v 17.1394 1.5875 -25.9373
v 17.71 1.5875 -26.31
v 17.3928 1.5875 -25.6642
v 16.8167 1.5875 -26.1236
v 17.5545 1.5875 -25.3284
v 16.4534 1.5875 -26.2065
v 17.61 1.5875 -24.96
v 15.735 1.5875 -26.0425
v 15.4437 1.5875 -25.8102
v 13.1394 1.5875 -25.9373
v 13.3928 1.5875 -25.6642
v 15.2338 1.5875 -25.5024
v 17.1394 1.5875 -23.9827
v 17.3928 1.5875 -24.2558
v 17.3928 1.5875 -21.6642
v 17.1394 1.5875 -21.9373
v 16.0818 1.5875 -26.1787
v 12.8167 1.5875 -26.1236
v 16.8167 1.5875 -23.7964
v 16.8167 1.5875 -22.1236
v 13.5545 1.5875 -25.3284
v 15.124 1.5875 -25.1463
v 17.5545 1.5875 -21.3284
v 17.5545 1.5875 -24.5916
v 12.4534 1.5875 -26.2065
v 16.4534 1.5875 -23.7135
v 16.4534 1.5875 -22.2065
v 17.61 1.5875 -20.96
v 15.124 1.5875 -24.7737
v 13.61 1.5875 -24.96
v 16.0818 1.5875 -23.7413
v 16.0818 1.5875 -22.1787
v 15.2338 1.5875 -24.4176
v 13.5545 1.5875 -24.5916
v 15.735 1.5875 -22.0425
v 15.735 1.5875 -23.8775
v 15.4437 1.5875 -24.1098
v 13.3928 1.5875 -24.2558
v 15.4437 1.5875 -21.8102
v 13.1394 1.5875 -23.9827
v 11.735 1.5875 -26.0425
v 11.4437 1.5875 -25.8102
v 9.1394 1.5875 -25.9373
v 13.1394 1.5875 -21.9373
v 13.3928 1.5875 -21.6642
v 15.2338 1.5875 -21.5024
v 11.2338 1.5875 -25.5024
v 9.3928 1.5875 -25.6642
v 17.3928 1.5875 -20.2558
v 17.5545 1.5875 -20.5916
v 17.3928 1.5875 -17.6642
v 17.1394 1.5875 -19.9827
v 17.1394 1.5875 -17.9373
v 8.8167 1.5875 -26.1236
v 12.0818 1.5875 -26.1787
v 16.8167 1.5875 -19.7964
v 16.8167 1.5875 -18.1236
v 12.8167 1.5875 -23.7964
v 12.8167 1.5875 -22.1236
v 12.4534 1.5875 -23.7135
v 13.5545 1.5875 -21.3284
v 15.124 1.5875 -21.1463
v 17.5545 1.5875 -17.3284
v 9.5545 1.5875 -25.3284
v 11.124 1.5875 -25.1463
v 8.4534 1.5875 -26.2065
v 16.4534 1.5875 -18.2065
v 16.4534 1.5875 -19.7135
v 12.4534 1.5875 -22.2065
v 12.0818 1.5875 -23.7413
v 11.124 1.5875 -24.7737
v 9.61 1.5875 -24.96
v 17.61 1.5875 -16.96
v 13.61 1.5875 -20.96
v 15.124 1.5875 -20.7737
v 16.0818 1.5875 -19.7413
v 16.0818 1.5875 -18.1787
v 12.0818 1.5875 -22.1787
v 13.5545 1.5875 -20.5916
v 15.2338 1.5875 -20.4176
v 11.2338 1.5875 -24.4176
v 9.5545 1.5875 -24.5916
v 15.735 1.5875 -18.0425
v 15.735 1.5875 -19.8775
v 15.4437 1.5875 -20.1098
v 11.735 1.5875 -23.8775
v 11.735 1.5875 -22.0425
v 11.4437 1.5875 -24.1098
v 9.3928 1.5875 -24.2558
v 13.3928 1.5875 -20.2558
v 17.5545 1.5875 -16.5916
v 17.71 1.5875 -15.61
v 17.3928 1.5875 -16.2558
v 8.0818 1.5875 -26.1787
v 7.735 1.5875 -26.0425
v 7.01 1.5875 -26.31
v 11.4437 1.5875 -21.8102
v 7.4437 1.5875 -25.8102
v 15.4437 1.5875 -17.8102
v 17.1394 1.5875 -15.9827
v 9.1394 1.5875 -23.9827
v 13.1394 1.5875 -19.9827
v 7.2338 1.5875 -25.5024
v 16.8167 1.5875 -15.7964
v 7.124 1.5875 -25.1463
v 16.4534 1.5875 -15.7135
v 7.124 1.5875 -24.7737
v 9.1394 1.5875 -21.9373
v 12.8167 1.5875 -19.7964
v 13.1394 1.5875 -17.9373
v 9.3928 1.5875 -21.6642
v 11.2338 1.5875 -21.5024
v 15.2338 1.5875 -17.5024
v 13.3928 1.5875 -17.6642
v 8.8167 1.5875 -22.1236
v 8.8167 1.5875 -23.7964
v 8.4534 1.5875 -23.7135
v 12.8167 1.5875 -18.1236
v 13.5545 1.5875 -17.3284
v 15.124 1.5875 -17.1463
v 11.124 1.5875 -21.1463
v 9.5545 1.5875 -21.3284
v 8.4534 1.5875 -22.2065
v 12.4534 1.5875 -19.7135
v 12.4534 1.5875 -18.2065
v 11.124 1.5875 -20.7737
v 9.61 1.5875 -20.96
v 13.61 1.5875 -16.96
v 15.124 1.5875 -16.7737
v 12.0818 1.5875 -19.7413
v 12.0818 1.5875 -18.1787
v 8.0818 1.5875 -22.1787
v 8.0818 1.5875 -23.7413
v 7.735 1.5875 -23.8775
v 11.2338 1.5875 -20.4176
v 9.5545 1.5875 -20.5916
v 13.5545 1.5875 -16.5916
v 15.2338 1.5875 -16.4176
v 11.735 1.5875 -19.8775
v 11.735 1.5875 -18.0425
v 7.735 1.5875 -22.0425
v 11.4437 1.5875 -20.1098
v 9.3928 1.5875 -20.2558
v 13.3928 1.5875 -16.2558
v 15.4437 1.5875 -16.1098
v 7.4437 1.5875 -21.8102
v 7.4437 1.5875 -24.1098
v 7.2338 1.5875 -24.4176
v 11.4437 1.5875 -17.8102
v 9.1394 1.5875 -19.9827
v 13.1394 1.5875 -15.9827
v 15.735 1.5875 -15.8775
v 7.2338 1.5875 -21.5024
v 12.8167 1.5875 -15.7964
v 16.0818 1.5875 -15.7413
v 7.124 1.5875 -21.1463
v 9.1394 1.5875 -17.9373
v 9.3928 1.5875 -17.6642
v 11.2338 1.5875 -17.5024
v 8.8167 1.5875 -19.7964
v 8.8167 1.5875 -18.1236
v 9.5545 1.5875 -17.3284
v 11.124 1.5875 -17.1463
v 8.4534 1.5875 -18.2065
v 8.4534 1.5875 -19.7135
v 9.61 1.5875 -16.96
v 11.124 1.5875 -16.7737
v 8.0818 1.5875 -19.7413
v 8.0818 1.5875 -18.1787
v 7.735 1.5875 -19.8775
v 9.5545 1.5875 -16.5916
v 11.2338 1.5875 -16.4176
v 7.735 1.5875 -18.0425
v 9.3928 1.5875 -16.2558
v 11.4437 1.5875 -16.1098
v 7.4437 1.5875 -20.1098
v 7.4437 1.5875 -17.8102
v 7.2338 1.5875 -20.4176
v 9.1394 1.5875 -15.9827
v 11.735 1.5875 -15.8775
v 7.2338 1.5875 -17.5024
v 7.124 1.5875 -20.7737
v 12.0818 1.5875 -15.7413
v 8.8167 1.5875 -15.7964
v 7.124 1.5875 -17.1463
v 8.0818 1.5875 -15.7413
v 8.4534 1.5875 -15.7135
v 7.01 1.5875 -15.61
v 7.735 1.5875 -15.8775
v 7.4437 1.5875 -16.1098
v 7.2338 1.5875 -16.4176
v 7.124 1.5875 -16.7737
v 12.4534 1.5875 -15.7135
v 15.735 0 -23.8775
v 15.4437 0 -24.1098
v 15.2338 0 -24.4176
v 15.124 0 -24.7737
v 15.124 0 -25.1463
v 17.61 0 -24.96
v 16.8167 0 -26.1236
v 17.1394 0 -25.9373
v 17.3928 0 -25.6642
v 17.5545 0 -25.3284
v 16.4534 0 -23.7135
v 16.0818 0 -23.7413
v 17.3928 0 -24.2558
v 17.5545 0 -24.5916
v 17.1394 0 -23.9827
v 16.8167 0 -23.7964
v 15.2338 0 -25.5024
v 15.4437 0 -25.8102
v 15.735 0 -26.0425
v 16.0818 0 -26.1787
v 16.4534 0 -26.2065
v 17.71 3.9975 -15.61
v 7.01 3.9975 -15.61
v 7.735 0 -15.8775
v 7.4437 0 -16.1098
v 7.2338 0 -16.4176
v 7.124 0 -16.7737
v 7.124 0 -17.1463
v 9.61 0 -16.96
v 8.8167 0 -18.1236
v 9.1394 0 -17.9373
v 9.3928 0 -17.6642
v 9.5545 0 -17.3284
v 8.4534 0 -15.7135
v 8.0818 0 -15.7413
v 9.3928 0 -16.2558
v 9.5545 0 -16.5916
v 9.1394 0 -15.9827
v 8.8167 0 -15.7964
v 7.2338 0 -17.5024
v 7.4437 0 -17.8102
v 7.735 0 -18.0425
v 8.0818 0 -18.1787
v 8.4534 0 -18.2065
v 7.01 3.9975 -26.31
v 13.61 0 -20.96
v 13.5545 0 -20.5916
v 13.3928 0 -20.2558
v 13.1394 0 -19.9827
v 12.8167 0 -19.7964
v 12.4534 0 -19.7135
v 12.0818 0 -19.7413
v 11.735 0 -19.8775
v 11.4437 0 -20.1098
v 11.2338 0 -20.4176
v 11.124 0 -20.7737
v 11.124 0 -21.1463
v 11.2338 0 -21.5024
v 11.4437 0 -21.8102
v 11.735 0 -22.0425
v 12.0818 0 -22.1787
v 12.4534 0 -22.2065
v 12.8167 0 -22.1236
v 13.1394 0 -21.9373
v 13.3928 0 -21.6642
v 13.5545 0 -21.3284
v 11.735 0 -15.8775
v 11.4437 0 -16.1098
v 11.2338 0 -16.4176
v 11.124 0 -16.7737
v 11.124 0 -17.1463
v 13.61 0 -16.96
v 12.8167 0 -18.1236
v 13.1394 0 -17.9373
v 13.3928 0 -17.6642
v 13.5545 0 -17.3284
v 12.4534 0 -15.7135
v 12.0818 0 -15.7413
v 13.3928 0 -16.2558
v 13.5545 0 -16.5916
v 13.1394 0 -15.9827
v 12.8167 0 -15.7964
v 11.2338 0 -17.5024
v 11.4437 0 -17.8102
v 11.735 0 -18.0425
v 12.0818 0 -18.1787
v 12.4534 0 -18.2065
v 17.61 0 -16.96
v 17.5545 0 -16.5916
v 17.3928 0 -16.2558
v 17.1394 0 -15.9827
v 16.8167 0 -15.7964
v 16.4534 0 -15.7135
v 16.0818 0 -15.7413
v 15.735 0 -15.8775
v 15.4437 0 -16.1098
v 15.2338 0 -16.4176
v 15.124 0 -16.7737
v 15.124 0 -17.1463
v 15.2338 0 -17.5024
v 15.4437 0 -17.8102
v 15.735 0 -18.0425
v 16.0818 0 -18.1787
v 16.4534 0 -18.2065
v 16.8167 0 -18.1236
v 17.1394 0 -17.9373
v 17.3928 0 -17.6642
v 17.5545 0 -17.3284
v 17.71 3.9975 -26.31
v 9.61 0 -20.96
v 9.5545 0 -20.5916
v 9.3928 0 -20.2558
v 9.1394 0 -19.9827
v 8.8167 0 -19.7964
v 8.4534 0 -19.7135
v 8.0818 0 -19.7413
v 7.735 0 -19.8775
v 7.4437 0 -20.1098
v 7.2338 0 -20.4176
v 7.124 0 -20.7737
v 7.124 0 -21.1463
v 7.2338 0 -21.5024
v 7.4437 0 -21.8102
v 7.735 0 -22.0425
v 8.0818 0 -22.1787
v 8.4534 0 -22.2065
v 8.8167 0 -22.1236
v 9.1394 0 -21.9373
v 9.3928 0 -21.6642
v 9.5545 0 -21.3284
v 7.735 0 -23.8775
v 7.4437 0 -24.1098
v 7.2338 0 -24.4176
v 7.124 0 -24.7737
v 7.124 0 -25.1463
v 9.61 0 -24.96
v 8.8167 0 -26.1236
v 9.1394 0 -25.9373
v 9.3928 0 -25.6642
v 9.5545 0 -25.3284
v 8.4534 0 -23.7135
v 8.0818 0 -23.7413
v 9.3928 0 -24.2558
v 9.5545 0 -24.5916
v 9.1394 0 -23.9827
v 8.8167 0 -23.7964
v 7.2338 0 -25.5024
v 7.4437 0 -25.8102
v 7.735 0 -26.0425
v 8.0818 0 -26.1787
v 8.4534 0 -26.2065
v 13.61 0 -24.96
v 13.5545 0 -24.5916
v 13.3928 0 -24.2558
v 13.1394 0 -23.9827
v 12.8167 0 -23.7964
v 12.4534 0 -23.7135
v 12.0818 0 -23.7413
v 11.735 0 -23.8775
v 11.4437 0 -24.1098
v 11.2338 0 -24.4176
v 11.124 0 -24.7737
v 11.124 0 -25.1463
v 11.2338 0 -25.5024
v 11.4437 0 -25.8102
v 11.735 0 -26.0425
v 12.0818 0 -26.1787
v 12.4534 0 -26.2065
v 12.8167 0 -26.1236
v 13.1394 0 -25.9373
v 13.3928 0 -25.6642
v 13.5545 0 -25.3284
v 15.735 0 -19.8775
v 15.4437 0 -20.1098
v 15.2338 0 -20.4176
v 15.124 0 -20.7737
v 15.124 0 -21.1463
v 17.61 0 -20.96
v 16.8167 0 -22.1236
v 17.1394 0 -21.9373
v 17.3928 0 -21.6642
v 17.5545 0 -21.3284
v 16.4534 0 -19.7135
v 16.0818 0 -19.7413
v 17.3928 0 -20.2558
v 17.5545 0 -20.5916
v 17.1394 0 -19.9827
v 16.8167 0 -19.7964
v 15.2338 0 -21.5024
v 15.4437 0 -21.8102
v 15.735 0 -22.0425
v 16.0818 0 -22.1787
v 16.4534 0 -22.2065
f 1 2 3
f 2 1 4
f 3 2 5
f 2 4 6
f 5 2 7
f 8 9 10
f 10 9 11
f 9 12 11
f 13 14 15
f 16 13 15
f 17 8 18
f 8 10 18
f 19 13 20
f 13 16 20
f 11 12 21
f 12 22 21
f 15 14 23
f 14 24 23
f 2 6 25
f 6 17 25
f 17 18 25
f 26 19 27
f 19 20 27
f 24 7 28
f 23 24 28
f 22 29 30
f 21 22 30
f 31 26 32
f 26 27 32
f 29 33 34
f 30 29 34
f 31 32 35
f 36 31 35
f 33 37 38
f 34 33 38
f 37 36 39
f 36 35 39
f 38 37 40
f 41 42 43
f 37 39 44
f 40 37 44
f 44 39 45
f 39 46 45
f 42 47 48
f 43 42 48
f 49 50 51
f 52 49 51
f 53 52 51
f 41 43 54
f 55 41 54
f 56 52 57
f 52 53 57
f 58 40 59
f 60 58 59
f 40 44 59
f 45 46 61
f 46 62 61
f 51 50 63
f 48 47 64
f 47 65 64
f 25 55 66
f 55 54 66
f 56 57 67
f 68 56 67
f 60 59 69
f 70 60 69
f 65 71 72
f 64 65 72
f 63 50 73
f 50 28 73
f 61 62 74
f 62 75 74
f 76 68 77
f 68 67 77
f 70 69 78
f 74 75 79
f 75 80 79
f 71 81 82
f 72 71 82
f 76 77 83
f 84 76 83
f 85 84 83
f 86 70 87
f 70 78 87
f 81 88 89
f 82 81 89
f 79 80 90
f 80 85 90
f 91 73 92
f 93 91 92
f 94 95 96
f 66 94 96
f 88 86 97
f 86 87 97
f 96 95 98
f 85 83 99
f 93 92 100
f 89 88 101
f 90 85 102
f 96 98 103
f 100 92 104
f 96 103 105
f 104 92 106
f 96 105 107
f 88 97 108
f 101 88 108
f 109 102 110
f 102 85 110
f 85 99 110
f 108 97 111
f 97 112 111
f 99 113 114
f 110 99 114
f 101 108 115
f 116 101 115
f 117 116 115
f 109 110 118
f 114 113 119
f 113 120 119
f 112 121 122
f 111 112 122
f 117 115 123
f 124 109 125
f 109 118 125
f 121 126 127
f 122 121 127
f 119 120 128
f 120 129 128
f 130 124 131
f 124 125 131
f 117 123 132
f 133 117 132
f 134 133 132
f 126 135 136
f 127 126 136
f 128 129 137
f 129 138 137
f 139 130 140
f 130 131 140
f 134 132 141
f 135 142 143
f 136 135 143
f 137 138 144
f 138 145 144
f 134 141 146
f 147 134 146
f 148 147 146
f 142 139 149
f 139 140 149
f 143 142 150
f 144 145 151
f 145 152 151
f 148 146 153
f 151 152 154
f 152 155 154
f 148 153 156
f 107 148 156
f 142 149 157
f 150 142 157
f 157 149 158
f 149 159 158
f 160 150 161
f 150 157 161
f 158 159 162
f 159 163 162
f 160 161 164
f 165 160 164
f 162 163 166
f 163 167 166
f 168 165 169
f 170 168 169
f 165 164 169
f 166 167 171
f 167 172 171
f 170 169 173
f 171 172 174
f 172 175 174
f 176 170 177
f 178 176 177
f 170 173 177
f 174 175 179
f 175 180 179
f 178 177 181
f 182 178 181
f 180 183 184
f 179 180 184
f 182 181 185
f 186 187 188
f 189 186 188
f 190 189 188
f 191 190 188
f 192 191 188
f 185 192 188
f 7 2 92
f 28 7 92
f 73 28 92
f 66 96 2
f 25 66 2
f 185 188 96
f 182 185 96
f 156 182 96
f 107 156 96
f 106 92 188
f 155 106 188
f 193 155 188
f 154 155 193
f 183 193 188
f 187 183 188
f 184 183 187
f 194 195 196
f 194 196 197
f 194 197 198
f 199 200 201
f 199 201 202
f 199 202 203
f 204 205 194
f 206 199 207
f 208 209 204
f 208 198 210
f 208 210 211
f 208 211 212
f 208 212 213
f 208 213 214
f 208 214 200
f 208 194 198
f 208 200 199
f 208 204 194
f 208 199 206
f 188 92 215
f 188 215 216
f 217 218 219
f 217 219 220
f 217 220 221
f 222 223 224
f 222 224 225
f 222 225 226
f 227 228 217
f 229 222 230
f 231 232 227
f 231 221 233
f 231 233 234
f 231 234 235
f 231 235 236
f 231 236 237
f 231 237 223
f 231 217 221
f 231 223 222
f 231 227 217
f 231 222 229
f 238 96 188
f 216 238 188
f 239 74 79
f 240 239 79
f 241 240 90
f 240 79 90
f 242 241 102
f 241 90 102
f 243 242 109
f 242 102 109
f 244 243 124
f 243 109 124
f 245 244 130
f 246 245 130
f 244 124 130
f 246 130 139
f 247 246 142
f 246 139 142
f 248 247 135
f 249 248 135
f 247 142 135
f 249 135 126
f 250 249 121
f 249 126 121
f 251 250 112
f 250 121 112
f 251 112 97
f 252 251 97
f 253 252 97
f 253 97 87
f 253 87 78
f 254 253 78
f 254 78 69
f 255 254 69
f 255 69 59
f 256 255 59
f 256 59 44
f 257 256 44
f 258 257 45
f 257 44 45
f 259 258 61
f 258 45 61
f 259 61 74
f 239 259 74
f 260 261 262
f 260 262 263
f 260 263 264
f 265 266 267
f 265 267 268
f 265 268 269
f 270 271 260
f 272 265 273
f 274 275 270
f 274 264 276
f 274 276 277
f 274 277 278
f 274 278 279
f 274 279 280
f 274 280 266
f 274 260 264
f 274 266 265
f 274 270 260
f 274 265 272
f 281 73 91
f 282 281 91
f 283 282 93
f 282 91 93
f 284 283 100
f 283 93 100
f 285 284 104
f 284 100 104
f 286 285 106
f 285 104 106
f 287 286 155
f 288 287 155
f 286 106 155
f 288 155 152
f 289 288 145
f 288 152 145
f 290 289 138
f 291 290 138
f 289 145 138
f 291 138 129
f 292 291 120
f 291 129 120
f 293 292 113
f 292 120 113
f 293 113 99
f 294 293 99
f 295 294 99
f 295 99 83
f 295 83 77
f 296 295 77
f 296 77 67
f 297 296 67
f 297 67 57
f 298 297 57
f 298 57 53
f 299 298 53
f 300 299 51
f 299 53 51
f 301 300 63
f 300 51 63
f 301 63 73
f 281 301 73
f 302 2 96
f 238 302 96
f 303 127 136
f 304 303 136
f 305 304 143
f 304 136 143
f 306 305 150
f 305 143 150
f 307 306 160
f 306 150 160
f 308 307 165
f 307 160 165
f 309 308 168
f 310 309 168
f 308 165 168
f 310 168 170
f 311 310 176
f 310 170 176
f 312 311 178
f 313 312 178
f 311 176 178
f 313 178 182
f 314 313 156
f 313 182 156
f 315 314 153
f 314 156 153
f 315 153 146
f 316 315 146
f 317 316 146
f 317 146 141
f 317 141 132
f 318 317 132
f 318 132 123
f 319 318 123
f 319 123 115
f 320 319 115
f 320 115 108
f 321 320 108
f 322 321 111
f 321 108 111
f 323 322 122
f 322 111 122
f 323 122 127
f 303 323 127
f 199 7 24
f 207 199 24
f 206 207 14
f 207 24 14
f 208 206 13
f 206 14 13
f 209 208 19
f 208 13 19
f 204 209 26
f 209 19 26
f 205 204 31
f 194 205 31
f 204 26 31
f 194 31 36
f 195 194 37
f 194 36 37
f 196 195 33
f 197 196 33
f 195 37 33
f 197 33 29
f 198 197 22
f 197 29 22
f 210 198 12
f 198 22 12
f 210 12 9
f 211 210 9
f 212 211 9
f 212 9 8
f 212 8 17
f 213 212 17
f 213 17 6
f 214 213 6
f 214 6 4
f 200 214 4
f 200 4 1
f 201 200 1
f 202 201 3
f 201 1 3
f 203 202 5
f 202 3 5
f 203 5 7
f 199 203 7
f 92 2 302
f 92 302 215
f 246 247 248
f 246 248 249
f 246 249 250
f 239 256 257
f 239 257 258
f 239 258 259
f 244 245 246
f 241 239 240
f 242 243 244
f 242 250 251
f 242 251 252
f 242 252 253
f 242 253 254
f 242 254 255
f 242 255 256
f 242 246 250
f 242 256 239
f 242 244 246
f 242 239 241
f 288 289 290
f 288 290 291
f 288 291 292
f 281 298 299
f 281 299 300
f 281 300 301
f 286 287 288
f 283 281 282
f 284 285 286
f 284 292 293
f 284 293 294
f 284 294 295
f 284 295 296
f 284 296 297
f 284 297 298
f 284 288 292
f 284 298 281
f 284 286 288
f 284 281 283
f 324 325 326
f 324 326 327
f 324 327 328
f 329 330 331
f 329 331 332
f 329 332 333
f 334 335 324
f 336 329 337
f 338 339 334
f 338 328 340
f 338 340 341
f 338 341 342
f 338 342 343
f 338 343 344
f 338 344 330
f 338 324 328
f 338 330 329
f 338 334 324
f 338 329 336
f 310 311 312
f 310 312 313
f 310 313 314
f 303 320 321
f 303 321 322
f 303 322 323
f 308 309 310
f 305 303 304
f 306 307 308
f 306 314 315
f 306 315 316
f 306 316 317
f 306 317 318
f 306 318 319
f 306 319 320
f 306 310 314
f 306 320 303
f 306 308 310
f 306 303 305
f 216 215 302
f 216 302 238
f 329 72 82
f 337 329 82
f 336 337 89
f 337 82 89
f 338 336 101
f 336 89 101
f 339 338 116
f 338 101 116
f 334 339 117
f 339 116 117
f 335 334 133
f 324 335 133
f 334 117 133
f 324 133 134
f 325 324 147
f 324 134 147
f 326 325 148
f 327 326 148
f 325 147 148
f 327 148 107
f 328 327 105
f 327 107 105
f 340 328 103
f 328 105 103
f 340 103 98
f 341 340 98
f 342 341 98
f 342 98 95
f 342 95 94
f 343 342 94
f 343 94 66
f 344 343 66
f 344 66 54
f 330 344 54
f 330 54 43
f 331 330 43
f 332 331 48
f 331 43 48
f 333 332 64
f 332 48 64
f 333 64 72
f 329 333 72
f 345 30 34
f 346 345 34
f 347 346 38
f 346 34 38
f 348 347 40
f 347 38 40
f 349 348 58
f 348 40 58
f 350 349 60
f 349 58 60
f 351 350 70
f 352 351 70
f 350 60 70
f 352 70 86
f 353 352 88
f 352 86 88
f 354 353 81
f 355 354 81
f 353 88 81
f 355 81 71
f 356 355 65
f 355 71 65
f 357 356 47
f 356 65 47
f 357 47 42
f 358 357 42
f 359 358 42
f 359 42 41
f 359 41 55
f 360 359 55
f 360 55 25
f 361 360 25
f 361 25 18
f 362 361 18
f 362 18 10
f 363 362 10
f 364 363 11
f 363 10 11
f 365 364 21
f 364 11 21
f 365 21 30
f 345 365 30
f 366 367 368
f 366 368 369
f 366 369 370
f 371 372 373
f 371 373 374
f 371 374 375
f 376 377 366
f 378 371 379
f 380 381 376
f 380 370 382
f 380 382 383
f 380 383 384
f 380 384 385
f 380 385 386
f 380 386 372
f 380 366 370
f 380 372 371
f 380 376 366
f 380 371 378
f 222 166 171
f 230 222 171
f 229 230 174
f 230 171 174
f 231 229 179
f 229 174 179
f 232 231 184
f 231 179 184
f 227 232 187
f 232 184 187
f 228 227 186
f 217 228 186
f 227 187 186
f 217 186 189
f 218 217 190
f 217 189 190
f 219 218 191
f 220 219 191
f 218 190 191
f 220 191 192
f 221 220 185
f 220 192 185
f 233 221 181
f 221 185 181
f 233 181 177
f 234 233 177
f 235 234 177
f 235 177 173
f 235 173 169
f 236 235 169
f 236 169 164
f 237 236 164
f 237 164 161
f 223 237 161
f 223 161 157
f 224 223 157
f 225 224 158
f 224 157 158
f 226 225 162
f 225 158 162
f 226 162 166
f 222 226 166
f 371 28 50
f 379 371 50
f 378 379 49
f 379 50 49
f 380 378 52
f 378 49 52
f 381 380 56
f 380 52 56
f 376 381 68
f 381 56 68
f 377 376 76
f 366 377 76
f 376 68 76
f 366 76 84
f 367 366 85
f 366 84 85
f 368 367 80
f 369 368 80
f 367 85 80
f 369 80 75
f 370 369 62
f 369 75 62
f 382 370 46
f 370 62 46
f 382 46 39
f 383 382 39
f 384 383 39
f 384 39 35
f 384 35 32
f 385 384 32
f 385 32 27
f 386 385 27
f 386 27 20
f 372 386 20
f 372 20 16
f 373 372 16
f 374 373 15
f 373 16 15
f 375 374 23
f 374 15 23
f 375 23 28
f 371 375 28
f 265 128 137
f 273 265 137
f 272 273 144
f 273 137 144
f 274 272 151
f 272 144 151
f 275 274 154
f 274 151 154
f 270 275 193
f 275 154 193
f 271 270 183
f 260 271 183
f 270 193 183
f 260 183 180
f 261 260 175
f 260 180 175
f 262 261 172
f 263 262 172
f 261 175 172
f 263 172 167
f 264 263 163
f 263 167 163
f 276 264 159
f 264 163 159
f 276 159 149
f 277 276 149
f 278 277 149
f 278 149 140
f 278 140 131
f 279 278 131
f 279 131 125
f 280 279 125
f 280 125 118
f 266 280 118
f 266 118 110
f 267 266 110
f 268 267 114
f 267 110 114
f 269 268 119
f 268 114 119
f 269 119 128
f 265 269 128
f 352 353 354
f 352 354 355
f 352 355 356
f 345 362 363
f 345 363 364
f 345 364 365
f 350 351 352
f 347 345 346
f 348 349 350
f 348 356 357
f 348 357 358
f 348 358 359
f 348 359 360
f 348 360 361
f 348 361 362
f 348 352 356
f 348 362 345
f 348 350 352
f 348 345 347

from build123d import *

# Parameters (mm, degrees)
SKETCH3_W           = 10.7
SKETCH3_H           = 10.7
BOSS_EXTRUDE2_DEPTH = 2.41
SKETCH5_R           = 1.25
BOSS_EXTRUDE3_DEPTH = 1.5875


with BuildPart() as part:
    # Sketch3 → Boss-Extrude2 (new body)
    with BuildSketch(Plane(origin=(0, 1.5875, 0), x_dir=(-1, 0, 0), z_dir=(0, 1, 0))):
        with Locations((-12.36, -20.96)):
            Rectangle(SKETCH3_W, SKETCH3_H)
    extrude(amount=BOSS_EXTRUDE2_DEPTH)

    # Sketch5 → Boss-Extrude3 (add)
    with BuildSketch(Plane.XZ.offset(-1.5875)):
        with Locations((16.36, -24.96)):
            Circle(SKETCH5_R)
        with Locations((12.36, -24.96)):
            Circle(SKETCH5_R)
        with Locations((8.36, -24.96)):
            Circle(SKETCH5_R)
        with Locations((16.36, -20.96)):
            Circle(SKETCH5_R)
        with Locations((12.36, -20.96)):
            Circle(SKETCH5_R)
        with Locations((8.36, -20.96)):
            Circle(SKETCH5_R)
        with Locations((16.36, -16.96)):
            Circle(SKETCH5_R)
        with Locations((12.36, -16.96)):
            Circle(SKETCH5_R)
        with Locations((8.36, -16.96)):
            Circle(SKETCH5_R)
    extrude(amount=BOSS_EXTRUDE3_DEPTH)


solid = part.part
